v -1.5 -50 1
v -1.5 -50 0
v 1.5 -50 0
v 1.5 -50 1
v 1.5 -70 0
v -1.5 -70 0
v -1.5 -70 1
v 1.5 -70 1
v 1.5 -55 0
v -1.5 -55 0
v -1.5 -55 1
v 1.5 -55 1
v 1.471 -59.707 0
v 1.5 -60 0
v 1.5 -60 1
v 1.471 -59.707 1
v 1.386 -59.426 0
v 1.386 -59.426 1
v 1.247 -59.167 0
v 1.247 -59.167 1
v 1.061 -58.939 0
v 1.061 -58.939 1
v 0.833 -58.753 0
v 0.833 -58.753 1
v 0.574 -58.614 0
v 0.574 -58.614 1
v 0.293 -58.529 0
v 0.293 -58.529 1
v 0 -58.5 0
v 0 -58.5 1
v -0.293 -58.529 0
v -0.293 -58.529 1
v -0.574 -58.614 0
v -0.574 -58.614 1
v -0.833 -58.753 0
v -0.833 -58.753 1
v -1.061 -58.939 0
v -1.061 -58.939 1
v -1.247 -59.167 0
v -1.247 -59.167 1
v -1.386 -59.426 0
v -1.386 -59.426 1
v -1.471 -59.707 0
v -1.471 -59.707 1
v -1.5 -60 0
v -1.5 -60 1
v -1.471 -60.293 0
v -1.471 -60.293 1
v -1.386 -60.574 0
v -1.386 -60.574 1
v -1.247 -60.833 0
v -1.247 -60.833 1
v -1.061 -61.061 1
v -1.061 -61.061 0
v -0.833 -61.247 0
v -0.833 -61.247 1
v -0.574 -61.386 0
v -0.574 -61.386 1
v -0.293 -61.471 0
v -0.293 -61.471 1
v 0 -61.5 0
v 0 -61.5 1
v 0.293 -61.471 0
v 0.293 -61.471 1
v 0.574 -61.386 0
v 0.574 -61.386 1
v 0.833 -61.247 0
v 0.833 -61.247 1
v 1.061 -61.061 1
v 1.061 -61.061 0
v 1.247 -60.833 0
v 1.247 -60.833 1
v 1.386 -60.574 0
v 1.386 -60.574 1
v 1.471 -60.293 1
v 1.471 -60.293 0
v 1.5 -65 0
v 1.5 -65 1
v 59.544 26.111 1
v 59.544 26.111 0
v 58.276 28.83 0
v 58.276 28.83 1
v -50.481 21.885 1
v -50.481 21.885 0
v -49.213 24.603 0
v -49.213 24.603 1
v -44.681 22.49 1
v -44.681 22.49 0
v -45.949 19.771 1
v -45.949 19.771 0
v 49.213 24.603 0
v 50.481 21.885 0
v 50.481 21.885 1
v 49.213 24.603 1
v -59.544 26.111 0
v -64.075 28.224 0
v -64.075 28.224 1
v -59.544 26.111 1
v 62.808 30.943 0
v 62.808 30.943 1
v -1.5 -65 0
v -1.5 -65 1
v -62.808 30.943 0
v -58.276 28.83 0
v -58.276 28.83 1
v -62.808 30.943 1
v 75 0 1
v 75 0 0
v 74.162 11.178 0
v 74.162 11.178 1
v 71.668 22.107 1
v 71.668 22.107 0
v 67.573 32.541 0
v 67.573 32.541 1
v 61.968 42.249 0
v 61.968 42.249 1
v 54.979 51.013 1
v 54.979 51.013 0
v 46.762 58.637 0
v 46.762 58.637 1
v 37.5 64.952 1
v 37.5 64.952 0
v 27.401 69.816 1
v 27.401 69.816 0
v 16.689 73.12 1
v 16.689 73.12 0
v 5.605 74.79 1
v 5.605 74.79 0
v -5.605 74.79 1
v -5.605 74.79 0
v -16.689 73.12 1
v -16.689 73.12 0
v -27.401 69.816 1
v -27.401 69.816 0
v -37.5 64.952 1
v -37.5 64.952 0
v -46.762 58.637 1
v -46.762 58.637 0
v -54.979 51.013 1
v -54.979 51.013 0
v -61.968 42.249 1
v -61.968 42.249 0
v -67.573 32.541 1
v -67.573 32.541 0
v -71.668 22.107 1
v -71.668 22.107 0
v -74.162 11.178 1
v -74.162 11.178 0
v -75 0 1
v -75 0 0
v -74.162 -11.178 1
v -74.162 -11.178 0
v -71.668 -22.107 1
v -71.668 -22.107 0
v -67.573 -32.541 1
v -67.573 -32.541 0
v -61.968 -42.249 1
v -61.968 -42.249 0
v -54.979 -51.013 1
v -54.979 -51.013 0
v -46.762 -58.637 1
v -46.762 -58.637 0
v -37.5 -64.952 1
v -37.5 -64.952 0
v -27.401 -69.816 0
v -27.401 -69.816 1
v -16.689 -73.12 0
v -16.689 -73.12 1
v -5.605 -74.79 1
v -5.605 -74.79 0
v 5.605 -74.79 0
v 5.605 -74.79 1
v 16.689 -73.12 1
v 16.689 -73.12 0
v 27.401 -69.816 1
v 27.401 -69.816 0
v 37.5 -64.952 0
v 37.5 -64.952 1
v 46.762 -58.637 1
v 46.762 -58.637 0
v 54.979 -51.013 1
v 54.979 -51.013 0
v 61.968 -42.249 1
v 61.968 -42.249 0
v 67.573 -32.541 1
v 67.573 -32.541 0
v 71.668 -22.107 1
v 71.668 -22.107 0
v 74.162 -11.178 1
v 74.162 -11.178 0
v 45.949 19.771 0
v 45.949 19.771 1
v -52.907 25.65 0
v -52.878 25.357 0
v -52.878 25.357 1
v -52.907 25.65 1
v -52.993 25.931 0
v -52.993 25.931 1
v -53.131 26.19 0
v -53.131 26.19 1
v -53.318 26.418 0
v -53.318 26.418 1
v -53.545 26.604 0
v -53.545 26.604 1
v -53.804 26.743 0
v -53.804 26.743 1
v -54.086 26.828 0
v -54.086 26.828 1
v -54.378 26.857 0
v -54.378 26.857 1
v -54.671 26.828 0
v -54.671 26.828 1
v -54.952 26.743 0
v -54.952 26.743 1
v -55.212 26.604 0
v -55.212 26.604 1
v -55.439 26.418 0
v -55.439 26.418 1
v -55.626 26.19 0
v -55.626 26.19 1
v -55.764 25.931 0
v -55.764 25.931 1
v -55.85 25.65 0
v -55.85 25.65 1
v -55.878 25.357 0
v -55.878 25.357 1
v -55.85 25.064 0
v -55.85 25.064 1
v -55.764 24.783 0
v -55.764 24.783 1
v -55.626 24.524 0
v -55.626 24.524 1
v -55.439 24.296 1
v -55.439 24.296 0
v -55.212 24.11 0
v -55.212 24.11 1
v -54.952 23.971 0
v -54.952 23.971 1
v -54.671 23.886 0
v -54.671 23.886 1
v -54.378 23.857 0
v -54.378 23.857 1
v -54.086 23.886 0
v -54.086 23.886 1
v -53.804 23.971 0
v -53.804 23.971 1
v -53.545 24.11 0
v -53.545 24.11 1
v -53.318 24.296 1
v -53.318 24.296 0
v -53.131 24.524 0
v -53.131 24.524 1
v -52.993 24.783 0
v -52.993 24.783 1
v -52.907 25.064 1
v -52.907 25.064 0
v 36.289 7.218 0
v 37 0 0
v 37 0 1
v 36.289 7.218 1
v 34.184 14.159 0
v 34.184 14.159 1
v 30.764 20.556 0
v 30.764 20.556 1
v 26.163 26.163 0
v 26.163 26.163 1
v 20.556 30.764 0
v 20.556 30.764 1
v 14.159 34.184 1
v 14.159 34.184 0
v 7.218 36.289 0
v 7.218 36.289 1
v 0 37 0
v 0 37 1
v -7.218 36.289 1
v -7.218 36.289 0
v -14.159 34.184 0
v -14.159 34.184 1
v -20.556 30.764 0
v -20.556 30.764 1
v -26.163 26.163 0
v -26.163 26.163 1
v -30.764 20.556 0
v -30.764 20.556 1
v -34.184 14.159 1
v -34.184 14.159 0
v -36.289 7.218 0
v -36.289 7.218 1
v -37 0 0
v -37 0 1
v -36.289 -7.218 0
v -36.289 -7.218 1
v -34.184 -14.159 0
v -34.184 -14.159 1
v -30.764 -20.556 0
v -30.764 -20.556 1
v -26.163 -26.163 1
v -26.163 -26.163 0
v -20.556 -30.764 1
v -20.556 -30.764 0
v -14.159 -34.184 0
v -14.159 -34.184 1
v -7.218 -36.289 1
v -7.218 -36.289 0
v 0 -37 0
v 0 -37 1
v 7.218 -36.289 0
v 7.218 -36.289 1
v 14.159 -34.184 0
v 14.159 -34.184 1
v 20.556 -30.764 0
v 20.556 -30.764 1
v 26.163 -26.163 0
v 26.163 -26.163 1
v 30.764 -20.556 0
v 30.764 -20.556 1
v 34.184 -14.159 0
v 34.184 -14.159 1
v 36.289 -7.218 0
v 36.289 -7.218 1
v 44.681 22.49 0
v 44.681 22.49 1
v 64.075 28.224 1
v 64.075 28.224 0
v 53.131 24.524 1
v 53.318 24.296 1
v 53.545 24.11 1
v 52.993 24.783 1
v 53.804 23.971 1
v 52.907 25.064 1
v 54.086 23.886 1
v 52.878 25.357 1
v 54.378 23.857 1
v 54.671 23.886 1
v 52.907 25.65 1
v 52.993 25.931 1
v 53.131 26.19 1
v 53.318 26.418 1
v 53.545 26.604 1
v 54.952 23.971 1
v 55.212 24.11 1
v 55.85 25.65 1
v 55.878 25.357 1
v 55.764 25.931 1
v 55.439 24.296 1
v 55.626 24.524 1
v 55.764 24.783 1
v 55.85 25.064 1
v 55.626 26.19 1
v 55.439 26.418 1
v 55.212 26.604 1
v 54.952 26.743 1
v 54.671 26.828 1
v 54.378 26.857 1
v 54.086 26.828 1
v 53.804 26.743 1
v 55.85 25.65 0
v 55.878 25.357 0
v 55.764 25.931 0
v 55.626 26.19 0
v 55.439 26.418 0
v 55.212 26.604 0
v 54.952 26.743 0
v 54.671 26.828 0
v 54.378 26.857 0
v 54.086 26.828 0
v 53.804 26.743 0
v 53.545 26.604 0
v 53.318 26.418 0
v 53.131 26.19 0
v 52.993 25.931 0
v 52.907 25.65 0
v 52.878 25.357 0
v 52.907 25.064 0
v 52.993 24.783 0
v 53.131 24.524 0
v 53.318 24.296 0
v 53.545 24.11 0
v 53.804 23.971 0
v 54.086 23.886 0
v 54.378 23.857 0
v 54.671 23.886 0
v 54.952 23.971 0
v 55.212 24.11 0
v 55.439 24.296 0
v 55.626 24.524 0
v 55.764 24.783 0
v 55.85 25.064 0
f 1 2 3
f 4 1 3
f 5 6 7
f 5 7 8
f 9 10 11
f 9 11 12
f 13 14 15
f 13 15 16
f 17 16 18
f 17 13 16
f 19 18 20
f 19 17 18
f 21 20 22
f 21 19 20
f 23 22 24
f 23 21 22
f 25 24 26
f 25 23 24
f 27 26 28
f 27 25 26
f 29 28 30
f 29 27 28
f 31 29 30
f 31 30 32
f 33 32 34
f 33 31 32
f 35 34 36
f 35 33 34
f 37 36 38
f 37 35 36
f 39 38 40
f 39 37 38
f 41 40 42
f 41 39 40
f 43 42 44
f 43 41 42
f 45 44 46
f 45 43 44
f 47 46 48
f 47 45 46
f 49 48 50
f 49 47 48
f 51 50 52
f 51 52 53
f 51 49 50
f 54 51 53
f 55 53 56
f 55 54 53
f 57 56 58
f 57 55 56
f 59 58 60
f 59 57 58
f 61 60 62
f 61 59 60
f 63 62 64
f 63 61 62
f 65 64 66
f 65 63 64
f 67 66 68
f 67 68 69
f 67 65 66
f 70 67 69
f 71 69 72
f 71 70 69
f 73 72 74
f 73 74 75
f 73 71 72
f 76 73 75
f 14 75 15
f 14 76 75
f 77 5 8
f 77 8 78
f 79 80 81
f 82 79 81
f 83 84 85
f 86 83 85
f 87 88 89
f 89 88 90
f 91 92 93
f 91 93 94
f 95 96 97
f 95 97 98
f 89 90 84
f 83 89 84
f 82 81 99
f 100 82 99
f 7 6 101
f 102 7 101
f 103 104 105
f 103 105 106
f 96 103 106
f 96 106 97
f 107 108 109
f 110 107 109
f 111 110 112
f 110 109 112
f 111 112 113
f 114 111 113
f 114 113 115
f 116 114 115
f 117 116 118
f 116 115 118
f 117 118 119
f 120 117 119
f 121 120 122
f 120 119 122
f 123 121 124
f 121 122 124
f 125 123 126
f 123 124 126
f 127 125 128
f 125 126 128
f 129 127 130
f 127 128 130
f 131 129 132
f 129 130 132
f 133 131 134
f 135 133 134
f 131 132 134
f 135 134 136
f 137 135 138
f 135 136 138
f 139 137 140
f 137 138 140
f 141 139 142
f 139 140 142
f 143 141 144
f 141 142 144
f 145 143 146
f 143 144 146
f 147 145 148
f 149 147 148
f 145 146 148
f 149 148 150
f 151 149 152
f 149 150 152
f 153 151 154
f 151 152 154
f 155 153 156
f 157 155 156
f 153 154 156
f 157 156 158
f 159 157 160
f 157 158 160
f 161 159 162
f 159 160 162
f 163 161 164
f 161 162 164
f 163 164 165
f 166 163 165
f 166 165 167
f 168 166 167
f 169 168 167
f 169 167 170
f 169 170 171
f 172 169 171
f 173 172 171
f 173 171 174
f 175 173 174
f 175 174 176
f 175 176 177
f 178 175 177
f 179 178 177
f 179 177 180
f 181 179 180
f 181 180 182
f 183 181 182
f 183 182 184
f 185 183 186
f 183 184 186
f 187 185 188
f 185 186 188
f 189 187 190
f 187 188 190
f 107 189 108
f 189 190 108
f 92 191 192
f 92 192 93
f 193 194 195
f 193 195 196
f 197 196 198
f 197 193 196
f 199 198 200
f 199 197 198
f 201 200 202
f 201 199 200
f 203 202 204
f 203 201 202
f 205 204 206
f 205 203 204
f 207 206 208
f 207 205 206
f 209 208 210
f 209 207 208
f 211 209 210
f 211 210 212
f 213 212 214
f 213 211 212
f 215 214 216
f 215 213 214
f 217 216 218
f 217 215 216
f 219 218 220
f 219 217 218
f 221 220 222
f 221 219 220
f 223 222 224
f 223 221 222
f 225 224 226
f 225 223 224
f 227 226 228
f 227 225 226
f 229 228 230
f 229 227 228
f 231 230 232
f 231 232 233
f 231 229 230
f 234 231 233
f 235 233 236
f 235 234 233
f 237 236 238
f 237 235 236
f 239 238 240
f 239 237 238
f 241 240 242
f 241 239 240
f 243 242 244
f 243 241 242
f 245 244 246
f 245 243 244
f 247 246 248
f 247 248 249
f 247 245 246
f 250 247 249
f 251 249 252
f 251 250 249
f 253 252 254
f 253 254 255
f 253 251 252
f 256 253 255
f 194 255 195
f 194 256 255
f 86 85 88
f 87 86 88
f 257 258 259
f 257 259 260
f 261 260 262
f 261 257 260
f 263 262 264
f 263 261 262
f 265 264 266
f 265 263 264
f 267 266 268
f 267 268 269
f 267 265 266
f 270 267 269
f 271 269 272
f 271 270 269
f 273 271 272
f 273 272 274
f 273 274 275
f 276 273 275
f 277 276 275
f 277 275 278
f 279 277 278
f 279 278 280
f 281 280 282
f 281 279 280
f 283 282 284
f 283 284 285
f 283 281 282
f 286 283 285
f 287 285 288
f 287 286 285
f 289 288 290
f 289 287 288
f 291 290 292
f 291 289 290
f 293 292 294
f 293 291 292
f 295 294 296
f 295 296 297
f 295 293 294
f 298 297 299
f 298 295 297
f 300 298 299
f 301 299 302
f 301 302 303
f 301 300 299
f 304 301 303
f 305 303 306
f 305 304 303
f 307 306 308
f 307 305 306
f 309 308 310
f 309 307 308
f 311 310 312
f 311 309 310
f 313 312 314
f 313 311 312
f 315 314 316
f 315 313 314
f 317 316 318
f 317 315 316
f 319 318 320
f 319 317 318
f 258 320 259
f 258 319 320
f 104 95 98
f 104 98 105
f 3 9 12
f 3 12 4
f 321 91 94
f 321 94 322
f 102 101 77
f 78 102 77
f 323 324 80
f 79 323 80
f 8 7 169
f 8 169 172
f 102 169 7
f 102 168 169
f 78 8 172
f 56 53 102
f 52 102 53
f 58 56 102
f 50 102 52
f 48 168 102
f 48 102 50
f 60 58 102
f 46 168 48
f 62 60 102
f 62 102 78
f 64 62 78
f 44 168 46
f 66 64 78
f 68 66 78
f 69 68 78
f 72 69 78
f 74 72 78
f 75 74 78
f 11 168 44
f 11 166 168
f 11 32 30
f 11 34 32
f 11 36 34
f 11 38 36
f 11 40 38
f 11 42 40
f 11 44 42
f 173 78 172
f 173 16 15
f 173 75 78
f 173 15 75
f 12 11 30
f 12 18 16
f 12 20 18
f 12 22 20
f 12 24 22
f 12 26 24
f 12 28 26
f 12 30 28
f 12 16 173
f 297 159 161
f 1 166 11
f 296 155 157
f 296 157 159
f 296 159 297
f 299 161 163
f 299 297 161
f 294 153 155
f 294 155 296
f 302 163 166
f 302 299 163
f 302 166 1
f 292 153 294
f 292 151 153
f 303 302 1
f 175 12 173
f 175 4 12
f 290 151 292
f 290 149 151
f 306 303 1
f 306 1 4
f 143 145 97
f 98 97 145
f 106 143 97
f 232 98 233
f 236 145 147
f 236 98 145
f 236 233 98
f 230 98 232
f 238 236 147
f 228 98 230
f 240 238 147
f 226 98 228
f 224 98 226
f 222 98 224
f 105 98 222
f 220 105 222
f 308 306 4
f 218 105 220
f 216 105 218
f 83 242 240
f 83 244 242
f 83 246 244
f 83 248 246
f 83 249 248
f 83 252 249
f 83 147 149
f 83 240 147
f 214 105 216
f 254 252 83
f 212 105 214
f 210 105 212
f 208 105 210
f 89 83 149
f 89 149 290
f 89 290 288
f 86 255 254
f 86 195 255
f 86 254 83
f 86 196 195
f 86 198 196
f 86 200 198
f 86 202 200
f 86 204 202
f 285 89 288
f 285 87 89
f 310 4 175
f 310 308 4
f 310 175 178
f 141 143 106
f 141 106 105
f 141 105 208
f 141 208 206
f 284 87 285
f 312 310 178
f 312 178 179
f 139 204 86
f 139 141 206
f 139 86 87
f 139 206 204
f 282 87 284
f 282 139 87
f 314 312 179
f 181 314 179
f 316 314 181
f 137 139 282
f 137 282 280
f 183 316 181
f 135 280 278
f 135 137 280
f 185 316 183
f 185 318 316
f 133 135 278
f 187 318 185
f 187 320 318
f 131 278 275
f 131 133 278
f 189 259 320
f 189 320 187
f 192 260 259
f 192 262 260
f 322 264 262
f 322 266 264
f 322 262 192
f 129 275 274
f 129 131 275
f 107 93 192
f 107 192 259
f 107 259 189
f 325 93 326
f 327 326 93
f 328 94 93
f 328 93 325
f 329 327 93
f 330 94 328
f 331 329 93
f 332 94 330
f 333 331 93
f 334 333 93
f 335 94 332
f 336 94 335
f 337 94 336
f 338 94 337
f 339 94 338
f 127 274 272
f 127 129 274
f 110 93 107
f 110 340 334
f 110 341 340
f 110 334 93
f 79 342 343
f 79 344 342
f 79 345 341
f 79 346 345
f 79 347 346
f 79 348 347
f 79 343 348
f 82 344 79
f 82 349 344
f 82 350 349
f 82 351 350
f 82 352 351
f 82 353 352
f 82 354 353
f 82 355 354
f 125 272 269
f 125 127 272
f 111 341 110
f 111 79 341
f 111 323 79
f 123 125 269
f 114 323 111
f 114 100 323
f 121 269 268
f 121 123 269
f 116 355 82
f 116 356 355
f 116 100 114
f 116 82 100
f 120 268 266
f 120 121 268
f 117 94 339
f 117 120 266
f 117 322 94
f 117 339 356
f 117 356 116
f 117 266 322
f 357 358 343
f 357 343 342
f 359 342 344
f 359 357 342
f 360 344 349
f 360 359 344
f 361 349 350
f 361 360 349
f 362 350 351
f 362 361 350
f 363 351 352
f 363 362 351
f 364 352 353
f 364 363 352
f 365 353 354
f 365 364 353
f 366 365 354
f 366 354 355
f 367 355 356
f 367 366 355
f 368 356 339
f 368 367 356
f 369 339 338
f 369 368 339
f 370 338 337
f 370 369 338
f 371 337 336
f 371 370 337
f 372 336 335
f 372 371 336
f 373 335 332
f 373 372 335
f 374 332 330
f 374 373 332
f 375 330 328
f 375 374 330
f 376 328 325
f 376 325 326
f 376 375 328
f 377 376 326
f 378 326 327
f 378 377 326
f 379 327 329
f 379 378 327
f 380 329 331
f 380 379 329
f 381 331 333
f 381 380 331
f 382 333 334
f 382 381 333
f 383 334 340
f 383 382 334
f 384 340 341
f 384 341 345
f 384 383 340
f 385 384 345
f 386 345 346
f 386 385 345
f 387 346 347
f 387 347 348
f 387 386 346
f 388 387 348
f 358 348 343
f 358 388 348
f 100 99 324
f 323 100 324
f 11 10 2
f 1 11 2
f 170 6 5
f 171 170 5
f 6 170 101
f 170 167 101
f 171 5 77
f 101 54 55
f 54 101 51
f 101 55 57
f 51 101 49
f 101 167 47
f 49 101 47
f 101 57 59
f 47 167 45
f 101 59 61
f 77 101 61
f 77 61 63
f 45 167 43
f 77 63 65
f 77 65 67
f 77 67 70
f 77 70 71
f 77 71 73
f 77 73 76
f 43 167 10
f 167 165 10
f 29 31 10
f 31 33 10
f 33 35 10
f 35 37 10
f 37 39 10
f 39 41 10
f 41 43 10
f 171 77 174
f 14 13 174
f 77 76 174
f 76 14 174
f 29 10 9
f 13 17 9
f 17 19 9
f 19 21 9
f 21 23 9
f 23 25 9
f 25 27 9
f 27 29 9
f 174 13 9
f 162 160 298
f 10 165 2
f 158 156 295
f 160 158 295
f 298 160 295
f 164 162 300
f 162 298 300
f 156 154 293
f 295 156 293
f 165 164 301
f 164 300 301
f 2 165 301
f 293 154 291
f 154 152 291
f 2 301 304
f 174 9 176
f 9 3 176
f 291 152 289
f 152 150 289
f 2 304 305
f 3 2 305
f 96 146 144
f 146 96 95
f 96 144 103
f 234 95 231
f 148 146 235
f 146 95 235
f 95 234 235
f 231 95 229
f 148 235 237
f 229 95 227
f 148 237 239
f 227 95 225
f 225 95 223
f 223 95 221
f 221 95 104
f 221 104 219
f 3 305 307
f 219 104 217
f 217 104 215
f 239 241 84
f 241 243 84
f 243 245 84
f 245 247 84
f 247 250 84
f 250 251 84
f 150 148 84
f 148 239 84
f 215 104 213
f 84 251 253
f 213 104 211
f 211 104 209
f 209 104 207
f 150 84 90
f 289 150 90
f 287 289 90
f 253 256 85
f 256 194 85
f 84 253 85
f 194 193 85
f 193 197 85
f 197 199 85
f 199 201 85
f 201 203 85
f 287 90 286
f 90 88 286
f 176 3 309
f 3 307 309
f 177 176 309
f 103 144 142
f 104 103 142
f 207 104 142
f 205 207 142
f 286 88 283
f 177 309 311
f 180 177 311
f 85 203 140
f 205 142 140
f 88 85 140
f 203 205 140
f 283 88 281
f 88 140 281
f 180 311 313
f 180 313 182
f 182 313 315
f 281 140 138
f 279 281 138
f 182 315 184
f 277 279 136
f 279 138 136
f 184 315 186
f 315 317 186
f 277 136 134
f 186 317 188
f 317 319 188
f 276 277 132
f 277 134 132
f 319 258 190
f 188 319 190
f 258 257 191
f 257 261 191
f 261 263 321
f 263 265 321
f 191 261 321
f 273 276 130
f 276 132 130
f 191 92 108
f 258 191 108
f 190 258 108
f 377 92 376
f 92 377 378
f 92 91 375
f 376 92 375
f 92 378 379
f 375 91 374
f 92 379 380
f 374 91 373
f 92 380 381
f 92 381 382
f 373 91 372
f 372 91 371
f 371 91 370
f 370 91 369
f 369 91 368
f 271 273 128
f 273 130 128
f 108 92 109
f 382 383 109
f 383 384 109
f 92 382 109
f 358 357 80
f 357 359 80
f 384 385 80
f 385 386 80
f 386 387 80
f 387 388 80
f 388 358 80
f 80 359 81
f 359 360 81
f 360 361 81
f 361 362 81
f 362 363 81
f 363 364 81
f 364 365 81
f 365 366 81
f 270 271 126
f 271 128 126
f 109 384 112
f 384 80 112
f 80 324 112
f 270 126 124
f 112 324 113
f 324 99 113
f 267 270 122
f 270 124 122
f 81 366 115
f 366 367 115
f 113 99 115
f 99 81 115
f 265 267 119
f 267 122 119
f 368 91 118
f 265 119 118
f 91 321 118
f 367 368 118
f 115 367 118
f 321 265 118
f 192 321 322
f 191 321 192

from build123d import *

# Parameters (mm, degrees)
SKETCH1_R           = 75
SKETCH1_R_2         = 37
SKETCH1_R_3         = 1.5
SKETCH1_W           = 3
SKETCH1_H           = 5
BOSS_EXTRUDE1_DEPTH = 1


with BuildPart() as part:
    # Sketch1 → Boss-Extrude1 (new body)
    with BuildSketch(Plane.XY):
        Circle(SKETCH1_R)
        Circle(SKETCH1_R_2, mode=Mode.SUBTRACT)
        with Locations((0, -60)):
            Circle(SKETCH1_R_3, mode=Mode.SUBTRACT)
        with Locations((54.378467222, 25.357095704)):
            Circle(SKETCH1_R_3, mode=Mode.SUBTRACT)
        with Locations((-54.378467222, 25.357095704)):
            Circle(SKETCH1_R_3, mode=Mode.SUBTRACT)
        with Locations((0, -52.5)):
            Rectangle(SKETCH1_W, SKETCH1_H, mode=Mode.SUBTRACT)
        with Locations((0, -67.5)):
            Rectangle(SKETCH1_W, SKETCH1_H, mode=Mode.SUBTRACT)
        Polygon((49.213000894, 24.603466076), (44.681461959, 22.490374768), (45.949316744, 19.771451406), (50.48085568, 21.884542715), align=None, mode=Mode.SUBTRACT)
        Polygon((58.276078765, 28.829648694), (62.8076177, 30.942740002), (64.075472485, 28.223816641), (59.54393355, 26.110725333), align=None, mode=Mode.SUBTRACT)
        Polygon((-58.276078765, 28.829648694), (-62.8076177, 30.942740002), (-64.075472485, 28.223816641), (-59.54393355, 26.110725333), align=None, mode=Mode.SUBTRACT)
        Polygon((-49.213000894, 24.603466076), (-44.681461959, 22.490374768), (-45.949316744, 19.771451406), (-50.48085568, 21.884542715), align=None, mode=Mode.SUBTRACT)
    extrude(amount=BOSS_EXTRUDE1_DEPTH)


solid = part.part
